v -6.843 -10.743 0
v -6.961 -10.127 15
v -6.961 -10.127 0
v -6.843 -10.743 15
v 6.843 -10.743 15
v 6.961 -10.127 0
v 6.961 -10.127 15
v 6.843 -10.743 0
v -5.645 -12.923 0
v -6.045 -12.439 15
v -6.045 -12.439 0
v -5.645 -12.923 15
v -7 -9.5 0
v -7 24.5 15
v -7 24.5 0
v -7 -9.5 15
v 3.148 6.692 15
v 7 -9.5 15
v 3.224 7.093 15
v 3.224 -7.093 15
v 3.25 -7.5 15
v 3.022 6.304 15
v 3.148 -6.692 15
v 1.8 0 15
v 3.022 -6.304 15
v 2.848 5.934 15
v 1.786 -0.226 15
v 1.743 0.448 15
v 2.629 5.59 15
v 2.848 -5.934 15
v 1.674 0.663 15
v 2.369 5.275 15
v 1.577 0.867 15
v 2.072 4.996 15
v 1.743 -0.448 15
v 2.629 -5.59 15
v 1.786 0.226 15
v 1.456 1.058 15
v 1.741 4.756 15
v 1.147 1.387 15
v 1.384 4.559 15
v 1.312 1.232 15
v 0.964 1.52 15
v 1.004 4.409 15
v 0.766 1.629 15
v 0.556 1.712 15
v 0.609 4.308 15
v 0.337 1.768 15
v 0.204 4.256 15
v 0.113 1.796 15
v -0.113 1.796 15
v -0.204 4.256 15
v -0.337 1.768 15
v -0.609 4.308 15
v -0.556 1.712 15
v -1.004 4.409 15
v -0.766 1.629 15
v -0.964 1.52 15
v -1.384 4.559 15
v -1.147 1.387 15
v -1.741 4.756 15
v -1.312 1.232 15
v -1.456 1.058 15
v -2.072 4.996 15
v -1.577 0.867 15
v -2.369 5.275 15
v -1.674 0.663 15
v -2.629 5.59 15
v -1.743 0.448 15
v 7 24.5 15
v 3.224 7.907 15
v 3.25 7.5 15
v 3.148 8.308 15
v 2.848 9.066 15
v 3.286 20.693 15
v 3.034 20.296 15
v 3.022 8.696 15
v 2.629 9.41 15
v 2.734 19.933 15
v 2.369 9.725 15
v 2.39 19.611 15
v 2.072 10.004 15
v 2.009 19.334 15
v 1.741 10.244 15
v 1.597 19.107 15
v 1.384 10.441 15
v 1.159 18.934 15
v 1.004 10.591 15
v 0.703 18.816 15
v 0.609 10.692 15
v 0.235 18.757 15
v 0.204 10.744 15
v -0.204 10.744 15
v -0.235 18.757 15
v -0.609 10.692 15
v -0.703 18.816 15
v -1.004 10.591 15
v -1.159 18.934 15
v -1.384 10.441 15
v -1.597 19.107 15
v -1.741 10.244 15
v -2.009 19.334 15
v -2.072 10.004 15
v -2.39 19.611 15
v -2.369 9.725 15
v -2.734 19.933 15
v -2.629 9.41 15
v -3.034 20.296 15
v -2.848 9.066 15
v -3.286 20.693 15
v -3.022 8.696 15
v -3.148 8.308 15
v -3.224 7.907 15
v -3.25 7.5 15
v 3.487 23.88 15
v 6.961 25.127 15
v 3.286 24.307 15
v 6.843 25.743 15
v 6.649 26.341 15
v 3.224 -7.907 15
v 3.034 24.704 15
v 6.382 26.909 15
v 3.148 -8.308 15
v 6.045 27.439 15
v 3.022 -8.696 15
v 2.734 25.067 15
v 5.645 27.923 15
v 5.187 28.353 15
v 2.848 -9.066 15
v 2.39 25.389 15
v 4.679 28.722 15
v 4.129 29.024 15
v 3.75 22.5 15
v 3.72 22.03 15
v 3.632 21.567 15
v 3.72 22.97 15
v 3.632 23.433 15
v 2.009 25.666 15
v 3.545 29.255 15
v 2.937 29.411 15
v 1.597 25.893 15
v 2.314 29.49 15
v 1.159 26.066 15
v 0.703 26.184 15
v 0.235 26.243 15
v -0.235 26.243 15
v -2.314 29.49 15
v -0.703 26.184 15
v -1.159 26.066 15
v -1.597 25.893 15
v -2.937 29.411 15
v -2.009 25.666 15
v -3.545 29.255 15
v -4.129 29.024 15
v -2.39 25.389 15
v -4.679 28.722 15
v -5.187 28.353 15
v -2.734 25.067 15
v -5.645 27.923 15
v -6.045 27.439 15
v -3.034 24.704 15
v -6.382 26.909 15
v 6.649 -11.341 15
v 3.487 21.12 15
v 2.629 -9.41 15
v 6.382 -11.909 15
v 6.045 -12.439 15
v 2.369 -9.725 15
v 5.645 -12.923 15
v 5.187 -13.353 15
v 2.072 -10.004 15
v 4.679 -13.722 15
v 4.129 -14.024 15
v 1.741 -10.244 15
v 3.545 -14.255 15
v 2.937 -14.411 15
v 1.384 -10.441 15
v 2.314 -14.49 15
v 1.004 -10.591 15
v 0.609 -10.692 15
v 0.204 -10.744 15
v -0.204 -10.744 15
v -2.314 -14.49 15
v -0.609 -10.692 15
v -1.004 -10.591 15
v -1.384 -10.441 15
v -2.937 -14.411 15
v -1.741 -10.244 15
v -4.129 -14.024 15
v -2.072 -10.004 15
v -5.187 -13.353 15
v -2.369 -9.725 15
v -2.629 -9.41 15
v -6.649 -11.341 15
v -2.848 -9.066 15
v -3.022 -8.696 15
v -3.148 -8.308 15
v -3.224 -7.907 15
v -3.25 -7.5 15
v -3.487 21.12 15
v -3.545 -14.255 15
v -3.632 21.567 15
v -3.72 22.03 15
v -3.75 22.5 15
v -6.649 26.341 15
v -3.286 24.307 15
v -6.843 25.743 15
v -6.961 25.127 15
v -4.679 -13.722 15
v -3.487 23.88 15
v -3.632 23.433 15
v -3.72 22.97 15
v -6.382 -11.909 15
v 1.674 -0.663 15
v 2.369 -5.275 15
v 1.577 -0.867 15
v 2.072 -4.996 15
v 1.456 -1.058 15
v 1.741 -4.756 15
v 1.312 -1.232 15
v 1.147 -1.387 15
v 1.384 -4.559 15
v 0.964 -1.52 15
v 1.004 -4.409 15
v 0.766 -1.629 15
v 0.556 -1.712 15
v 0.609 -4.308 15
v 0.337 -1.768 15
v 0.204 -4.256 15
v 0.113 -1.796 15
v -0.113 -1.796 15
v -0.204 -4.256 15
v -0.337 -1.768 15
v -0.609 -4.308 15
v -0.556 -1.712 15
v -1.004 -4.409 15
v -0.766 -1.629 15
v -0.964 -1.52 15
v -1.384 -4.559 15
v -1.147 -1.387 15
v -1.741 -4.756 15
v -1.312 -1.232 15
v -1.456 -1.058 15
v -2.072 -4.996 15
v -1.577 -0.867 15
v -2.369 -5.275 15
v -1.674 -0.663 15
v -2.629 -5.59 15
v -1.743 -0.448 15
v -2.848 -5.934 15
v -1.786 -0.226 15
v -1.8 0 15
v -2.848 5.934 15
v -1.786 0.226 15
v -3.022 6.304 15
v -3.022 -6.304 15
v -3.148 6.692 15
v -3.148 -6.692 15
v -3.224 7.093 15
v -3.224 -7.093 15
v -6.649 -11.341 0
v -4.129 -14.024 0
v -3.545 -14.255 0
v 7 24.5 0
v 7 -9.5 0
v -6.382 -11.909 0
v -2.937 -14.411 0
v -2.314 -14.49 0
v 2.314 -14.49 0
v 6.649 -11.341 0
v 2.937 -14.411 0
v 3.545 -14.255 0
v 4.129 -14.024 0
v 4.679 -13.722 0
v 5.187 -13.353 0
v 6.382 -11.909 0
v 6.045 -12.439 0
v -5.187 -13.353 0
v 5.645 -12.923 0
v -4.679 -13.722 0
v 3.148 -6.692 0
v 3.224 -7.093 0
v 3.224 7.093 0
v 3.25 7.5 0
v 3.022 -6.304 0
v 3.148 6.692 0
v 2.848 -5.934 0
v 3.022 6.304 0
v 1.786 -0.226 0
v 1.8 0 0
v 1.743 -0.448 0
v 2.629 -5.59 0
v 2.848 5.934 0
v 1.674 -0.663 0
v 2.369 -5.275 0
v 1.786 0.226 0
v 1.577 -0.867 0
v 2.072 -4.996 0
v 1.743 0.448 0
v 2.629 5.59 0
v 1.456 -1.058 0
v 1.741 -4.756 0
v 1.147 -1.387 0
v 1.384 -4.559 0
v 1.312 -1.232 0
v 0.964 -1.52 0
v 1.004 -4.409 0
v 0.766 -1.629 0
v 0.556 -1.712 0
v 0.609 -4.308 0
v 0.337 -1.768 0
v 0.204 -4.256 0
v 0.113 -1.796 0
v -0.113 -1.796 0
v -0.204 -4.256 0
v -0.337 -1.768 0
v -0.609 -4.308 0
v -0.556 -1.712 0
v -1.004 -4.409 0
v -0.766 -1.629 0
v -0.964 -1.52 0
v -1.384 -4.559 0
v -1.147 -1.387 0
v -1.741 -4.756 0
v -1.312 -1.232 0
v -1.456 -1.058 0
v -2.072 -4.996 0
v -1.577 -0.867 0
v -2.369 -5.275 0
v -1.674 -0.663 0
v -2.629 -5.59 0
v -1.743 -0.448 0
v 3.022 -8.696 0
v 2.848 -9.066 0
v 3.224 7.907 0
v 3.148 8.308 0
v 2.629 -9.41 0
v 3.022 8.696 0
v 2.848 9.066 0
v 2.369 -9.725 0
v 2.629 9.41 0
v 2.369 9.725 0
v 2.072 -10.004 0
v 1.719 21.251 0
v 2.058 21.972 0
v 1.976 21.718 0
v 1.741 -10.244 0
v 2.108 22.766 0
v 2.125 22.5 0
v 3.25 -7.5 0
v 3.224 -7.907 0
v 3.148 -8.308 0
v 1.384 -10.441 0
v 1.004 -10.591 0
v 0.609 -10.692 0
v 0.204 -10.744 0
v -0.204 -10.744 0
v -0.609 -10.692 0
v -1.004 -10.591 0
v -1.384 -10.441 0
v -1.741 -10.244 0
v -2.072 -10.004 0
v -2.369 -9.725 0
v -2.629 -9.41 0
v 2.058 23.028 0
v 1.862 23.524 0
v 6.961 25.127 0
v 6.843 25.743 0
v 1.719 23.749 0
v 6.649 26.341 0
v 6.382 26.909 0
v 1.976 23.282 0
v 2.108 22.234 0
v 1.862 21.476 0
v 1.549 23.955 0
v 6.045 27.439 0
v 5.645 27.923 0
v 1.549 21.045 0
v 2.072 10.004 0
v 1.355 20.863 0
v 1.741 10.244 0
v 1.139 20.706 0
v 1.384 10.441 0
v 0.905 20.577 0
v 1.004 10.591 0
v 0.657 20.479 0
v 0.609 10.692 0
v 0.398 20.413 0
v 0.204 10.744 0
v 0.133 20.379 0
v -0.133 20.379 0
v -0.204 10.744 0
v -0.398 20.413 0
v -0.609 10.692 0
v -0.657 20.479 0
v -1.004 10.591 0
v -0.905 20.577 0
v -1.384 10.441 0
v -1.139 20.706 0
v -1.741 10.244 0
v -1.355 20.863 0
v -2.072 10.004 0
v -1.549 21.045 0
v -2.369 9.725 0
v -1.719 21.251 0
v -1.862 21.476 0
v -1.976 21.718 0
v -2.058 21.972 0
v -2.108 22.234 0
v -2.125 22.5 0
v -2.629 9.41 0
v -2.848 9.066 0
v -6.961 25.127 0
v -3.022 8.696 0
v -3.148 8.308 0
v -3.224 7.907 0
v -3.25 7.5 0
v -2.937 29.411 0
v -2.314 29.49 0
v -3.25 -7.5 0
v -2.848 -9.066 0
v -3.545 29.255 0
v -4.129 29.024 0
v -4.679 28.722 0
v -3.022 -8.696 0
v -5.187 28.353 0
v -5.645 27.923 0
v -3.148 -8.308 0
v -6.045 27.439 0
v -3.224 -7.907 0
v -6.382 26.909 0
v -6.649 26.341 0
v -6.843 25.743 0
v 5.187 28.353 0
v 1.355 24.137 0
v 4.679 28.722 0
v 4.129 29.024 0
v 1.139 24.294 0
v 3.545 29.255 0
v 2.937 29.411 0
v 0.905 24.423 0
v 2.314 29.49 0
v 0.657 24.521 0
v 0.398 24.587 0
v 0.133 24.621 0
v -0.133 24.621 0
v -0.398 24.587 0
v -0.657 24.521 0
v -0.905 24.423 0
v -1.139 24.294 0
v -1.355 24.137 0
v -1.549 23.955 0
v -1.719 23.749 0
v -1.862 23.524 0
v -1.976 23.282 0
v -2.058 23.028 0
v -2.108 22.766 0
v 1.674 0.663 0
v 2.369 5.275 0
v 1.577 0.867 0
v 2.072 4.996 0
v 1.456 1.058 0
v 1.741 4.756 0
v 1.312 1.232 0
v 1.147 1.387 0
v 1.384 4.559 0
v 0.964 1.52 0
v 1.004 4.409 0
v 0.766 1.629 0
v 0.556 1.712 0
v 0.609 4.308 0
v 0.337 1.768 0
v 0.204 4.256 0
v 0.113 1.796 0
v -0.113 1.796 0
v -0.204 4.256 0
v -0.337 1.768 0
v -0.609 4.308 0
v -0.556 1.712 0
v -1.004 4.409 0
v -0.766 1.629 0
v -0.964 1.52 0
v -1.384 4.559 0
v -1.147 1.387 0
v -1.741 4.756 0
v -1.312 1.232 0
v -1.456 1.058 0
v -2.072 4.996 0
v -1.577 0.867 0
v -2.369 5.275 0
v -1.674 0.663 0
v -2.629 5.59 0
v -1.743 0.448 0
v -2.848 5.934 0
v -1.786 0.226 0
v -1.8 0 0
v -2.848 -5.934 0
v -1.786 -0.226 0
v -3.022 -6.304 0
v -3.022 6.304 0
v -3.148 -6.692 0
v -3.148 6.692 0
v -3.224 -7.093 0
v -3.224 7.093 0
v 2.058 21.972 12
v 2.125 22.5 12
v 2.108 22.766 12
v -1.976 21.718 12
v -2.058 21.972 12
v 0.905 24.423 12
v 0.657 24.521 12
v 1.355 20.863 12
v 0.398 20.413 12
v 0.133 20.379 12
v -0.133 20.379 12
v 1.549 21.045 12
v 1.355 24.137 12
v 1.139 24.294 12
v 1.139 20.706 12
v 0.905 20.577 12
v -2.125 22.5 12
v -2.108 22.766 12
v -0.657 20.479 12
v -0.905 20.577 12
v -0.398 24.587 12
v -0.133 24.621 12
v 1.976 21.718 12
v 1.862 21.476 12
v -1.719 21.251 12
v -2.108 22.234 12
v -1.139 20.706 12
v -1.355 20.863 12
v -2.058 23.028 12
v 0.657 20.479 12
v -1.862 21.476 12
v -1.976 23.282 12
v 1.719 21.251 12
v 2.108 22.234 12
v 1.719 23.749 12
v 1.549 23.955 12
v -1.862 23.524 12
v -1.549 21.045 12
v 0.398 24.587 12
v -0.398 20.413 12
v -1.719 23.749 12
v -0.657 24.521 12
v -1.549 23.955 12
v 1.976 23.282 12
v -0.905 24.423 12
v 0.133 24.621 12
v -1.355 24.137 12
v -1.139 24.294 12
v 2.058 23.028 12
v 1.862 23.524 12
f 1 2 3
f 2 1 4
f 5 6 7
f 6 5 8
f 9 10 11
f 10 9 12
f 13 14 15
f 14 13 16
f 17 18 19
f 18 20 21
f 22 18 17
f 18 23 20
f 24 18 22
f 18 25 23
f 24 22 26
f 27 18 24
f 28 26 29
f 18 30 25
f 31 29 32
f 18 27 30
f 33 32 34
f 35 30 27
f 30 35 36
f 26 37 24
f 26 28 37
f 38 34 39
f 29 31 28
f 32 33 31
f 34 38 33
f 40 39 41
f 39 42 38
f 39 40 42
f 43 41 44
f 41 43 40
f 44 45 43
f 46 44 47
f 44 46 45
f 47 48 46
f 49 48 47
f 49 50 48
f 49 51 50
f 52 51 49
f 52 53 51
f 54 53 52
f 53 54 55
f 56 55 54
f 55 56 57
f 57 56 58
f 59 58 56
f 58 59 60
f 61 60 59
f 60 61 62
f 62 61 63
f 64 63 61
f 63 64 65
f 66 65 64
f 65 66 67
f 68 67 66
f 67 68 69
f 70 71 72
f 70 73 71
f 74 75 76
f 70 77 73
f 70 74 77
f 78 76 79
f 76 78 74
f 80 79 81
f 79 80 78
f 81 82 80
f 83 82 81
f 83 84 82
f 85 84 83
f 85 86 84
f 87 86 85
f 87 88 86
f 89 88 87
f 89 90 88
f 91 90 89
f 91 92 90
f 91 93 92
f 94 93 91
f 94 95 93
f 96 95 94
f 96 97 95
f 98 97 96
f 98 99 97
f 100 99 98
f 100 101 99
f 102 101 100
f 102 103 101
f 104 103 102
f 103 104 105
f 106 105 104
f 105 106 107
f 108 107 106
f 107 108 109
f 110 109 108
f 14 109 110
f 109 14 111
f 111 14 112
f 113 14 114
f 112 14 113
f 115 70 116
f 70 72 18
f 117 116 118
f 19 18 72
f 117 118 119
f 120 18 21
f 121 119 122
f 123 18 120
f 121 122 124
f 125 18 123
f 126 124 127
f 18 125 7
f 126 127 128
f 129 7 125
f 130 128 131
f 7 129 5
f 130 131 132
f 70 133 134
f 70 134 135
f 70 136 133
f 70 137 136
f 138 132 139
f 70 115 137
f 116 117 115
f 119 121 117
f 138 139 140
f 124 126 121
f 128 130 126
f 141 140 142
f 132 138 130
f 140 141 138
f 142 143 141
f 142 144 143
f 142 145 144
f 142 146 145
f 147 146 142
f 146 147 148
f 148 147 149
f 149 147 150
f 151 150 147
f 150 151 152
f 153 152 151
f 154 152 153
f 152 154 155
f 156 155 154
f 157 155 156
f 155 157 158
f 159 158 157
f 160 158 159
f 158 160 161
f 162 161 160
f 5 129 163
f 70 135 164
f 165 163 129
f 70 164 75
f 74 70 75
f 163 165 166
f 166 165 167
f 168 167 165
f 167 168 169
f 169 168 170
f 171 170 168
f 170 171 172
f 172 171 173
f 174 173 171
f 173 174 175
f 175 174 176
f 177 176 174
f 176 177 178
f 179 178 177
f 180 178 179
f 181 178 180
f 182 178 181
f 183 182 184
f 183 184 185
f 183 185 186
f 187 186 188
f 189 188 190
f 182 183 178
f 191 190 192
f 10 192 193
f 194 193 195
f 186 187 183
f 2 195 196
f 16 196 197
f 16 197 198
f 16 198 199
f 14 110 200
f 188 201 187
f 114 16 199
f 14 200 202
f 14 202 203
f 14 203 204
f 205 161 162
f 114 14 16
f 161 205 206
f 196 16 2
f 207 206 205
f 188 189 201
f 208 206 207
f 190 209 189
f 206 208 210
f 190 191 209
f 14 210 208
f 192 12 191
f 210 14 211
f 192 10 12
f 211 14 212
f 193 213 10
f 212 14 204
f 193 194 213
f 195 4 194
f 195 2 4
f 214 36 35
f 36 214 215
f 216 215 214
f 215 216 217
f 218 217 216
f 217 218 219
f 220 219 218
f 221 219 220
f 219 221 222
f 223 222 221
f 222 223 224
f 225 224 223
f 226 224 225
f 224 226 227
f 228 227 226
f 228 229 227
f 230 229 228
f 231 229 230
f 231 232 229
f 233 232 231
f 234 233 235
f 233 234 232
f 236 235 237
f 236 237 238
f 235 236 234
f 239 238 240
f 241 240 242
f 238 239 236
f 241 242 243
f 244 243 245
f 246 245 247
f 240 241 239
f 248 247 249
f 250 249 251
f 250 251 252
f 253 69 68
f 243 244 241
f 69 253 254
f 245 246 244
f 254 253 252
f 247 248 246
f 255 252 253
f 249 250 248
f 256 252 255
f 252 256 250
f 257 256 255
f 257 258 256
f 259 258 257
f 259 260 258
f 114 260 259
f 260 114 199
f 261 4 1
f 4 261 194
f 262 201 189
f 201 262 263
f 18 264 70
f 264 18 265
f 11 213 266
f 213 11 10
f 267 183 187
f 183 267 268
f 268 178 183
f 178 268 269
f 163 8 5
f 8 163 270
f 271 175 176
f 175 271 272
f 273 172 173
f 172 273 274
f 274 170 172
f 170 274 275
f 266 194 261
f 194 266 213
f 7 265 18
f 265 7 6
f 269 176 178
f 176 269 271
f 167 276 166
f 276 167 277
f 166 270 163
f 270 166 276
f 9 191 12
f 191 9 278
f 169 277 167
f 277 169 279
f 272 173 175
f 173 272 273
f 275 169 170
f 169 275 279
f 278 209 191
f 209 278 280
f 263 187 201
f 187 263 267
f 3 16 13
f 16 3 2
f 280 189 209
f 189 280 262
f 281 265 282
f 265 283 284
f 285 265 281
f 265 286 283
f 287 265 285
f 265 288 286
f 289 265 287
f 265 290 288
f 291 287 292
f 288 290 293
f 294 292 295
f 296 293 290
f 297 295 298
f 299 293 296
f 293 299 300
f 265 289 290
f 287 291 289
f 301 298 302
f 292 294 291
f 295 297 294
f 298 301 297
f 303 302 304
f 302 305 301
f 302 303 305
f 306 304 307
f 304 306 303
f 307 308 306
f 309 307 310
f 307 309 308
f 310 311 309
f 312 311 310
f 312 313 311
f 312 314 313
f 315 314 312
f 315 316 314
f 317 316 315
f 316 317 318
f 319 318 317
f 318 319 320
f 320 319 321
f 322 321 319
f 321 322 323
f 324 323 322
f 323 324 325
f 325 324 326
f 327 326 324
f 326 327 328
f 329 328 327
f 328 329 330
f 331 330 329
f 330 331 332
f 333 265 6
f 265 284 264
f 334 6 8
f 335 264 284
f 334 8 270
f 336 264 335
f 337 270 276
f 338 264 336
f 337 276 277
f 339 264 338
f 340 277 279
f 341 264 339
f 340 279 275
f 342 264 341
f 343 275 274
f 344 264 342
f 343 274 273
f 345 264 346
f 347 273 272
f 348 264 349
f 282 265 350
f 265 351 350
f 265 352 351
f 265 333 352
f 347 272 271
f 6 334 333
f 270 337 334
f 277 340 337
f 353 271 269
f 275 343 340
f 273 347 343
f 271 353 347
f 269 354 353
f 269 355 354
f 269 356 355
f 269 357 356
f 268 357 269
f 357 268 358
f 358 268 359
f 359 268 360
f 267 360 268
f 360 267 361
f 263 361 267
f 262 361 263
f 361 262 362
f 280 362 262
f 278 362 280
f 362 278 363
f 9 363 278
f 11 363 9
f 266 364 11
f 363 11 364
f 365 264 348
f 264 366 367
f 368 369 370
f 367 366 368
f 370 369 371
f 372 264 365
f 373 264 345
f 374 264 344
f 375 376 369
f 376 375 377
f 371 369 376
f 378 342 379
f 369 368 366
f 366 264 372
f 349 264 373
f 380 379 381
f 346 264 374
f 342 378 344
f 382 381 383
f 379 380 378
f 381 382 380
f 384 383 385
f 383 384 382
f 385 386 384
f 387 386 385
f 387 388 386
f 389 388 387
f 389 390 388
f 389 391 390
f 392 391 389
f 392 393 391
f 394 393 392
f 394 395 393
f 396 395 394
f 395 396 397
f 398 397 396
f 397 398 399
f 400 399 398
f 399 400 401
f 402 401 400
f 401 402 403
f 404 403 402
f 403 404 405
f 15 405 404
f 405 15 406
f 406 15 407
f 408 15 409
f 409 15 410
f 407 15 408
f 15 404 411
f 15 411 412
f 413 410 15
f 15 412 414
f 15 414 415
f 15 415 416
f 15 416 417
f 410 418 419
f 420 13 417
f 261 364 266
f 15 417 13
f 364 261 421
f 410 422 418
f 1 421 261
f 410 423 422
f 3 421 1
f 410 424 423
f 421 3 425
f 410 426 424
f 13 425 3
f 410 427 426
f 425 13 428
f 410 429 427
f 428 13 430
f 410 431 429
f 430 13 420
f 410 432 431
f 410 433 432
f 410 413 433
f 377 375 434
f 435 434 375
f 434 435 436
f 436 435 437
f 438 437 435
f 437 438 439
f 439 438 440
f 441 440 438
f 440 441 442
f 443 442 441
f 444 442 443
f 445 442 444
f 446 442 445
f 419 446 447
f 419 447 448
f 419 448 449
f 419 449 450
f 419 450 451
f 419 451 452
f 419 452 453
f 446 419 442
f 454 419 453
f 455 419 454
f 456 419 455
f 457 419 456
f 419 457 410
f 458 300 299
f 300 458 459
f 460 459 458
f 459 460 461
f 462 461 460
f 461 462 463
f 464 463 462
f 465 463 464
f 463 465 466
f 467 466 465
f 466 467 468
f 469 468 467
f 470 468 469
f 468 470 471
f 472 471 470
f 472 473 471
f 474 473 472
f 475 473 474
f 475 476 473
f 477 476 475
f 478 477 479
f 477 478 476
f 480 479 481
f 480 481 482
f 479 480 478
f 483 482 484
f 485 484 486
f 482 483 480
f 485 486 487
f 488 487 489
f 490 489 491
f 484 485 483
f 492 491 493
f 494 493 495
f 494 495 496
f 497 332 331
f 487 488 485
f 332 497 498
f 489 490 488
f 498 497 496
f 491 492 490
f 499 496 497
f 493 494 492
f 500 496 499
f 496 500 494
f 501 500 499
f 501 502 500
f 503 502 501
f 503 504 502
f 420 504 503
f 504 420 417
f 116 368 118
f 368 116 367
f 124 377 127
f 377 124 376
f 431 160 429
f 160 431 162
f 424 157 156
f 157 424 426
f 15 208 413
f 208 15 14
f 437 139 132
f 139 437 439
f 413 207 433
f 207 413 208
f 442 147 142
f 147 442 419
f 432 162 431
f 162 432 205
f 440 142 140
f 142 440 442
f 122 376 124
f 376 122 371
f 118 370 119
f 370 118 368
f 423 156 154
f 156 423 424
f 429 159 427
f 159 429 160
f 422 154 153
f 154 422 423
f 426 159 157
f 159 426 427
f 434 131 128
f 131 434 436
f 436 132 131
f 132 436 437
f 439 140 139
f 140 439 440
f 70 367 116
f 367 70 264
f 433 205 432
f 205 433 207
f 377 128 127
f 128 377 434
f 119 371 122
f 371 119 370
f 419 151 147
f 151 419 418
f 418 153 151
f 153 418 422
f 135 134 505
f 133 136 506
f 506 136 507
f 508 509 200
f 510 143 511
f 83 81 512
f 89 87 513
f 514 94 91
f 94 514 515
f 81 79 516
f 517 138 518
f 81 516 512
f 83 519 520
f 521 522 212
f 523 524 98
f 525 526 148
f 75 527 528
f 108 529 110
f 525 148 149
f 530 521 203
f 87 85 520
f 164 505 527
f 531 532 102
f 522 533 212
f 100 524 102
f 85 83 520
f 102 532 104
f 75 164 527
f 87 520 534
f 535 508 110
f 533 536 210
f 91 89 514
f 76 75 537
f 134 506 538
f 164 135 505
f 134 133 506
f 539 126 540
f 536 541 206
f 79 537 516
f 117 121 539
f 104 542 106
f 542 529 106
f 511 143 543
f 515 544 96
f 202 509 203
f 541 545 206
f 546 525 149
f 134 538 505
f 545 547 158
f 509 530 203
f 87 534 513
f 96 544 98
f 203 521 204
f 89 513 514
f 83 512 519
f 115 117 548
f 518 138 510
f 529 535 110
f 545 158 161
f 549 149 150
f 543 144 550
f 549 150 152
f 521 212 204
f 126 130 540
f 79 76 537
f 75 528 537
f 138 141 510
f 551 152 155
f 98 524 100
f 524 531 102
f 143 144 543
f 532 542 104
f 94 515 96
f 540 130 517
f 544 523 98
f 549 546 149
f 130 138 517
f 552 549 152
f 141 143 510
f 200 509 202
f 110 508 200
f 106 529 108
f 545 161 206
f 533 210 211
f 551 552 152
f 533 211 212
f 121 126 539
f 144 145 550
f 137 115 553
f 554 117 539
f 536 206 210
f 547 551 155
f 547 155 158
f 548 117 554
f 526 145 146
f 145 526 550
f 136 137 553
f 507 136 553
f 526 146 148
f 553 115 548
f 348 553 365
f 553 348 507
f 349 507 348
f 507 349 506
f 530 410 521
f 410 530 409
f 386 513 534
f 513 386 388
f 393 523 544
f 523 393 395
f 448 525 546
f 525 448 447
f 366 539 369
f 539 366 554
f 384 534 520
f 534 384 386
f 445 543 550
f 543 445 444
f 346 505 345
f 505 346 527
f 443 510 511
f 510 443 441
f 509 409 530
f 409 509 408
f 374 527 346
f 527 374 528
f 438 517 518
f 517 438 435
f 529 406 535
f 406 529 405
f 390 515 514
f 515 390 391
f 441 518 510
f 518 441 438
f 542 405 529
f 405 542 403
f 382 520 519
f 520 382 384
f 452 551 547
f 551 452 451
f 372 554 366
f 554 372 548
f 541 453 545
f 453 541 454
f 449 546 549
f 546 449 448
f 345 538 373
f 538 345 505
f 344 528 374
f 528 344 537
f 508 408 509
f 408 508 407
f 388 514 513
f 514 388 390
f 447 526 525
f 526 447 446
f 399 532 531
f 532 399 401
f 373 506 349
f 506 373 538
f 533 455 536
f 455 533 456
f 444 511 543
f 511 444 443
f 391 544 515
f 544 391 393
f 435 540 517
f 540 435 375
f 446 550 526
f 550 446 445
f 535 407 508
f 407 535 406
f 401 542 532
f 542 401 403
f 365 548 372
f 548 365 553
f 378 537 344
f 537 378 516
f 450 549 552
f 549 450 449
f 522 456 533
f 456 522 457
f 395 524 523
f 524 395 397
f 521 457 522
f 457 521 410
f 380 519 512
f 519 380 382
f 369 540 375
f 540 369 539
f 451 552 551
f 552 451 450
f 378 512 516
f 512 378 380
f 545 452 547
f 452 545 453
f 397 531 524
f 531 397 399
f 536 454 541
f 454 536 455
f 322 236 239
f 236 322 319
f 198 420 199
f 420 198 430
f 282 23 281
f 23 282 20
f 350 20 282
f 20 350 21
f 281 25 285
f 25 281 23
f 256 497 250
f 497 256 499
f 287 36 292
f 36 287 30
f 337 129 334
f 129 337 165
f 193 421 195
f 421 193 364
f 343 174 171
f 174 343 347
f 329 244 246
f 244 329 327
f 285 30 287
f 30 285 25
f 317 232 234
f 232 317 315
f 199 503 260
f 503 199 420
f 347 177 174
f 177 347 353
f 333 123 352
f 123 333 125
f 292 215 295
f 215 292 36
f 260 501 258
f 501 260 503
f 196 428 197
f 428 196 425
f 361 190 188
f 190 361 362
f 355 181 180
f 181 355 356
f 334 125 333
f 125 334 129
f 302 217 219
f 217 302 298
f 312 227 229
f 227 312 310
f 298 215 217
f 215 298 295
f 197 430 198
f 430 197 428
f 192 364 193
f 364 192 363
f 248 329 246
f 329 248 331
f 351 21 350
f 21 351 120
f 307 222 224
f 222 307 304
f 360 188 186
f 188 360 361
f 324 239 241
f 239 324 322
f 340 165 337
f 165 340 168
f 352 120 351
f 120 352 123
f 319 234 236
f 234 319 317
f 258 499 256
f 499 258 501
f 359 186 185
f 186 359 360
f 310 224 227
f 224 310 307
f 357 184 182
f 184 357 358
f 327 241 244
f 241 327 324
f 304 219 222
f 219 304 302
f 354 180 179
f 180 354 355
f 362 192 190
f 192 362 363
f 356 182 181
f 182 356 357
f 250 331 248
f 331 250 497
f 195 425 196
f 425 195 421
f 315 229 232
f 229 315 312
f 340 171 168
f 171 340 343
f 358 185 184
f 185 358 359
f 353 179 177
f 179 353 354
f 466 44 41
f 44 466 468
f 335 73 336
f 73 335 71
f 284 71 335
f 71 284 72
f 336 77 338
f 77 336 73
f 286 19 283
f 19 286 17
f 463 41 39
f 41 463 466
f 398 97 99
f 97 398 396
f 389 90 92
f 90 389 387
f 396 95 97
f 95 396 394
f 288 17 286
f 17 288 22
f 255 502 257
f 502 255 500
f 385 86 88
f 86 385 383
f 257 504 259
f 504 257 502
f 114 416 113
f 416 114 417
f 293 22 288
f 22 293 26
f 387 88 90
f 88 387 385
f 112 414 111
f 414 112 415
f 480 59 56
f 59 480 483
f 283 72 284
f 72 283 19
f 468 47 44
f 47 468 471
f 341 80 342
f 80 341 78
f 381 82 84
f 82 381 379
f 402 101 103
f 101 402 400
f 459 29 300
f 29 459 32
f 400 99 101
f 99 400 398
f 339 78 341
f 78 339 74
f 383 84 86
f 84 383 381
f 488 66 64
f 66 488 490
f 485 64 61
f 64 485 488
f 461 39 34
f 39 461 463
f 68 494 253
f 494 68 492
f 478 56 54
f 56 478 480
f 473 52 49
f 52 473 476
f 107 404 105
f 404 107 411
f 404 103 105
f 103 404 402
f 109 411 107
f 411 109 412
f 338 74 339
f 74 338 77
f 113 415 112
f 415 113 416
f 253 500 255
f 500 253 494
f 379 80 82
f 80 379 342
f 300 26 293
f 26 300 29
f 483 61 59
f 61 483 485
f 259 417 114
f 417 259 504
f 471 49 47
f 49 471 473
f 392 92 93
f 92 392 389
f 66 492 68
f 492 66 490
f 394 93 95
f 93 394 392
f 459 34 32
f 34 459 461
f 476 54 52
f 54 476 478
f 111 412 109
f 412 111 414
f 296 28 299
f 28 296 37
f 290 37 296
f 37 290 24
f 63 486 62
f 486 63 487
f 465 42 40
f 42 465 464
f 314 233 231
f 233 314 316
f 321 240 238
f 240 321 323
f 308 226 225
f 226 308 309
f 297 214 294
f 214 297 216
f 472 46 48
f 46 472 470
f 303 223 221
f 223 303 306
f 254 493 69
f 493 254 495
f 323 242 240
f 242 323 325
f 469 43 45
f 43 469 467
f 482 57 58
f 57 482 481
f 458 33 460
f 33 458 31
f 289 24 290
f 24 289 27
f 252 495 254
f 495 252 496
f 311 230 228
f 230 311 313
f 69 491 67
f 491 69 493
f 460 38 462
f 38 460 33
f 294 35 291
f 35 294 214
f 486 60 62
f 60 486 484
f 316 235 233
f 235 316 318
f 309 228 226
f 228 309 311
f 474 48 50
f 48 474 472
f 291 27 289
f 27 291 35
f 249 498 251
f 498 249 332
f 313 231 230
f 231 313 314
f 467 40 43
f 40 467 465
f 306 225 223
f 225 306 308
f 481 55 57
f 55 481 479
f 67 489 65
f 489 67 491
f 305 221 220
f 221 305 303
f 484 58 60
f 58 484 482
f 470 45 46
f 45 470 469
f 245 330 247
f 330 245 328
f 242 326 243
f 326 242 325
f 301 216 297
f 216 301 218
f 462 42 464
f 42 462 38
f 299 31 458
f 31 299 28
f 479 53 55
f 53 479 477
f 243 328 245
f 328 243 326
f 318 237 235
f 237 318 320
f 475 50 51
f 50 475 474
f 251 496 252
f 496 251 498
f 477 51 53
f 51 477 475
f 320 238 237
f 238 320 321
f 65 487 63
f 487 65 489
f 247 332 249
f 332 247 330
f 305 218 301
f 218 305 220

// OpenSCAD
$fn = 50;


difference() {
	union() {
		hull() {
			translate(v = [-2.0000000000, 9.5000000000, 0]) {
				cylinder(h = 15, r = 5);
			}
			translate(v = [2.0000000000, 9.5000000000, 0]) {
				cylinder(h = 15, r = 5);
			}
			translate(v = [-2.0000000000, -9.5000000000, 0]) {
				cylinder(h = 15, r = 5);
			}
			translate(v = [2.0000000000, -9.5000000000, 0]) {
				cylinder(h = 15, r = 5);
			}
		}
		translate(v = [0.0000000000, 15.0000000000, 0]) {
			hull() {
				translate(v = [-2.0000000000, 9.5000000000, 0]) {
					cylinder(h = 15, r = 5);
				}
				translate(v = [2.0000000000, 9.5000000000, 0]) {
					cylinder(h = 15, r = 5);
				}
				translate(v = [-2.0000000000, -9.5000000000, 0]) {
					cylinder(h = 15, r = 5);
				}
				translate(v = [2.0000000000, -9.5000000000, 0]) {
					cylinder(h = 15, r = 5);
				}
			}
		}
		translate(v = [0.0000000000, 15.0000000000, 0]) {
			hull() {
				translate(v = [-2.0000000000, 9.5000000000, 0]) {
					cylinder(h = 15, r = 5);
				}
				translate(v = [2.0000000000, 9.5000000000, 0]) {
					cylinder(h = 15, r = 5);
				}
				translate(v = [-2.0000000000, -9.5000000000, 0]) {
					cylinder(h = 15, r = 5);
				}
				translate(v = [2.0000000000, -9.5000000000, 0]) {
					cylinder(h = 15, r = 5);
				}
			}
		}
	}
	union() {
		translate(v = [0.0000000000, 22.5000000000, 15]) {
			rotate(a = [0, 0, 0]) {
				difference() {
					union() {
						#translate(v = [0, 0, -15.0000000000]) {
							cylinder(h = 15, r = 2.0000000000);
						}
						#translate(v = [0, 0, -3]) {
							cylinder(h = 3, r1 = 2.1250000000, r2 = 3.7500000000);
						}
						#translate(v = [0, 0, -15.0000000000]) {
							cylinder(h = 15, r = 2.1250000000);
						}
						#translate(v = [0, 0, -15.0000000000]) {
							cylinder(h = 15, r = 2.0000000000);
						}
					}
					union();
				}
			}
		}
		translate(v = [0.0000000000, 22.5000000000, 15]) {
			rotate(a = [0, 0, 0]) {
				difference() {
					union() {
						#translate(v = [0, 0, -15.0000000000]) {
							cylinder(h = 15, r = 2.0000000000);
						}
						#translate(v = [0, 0, -3]) {
							cylinder(h = 3, r1 = 2.1250000000, r2 = 3.7500000000);
						}
						#translate(v = [0, 0, -15.0000000000]) {
							cylinder(h = 15, r = 2.1250000000);
						}
						#translate(v = [0, 0, -15.0000000000]) {
							cylinder(h = 15, r = 2.0000000000);
						}
					}
					union();
				}
			}
		}
		translate(v = [0.0000000000, -7.5000000000, 0]) {
			translate(v = [0, 0, -100]) {
				cylinder(h = 200, r = 3.2500000000);
			}
		}
		translate(v = [0.0000000000, 7.5000000000, 0]) {
			translate(v = [0, 0, -100]) {
				cylinder(h = 200, r = 3.2500000000);
			}
		}
		translate(v = [0.0000000000, -7.5000000000, 0]) {
			translate(v = [0, 0, -100]) {
				cylinder(h = 200, r = 1.8000000000);
			}
		}
		translate(v = [0, 0, -100]) {
			cylinder(h = 200, r = 1.8000000000);
		}
		translate(v = [0.0000000000, 7.5000000000, 0]) {
			translate(v = [0, 0, -100]) {
				cylinder(h = 200, r = 1.8000000000);
			}
		}
	}
}
